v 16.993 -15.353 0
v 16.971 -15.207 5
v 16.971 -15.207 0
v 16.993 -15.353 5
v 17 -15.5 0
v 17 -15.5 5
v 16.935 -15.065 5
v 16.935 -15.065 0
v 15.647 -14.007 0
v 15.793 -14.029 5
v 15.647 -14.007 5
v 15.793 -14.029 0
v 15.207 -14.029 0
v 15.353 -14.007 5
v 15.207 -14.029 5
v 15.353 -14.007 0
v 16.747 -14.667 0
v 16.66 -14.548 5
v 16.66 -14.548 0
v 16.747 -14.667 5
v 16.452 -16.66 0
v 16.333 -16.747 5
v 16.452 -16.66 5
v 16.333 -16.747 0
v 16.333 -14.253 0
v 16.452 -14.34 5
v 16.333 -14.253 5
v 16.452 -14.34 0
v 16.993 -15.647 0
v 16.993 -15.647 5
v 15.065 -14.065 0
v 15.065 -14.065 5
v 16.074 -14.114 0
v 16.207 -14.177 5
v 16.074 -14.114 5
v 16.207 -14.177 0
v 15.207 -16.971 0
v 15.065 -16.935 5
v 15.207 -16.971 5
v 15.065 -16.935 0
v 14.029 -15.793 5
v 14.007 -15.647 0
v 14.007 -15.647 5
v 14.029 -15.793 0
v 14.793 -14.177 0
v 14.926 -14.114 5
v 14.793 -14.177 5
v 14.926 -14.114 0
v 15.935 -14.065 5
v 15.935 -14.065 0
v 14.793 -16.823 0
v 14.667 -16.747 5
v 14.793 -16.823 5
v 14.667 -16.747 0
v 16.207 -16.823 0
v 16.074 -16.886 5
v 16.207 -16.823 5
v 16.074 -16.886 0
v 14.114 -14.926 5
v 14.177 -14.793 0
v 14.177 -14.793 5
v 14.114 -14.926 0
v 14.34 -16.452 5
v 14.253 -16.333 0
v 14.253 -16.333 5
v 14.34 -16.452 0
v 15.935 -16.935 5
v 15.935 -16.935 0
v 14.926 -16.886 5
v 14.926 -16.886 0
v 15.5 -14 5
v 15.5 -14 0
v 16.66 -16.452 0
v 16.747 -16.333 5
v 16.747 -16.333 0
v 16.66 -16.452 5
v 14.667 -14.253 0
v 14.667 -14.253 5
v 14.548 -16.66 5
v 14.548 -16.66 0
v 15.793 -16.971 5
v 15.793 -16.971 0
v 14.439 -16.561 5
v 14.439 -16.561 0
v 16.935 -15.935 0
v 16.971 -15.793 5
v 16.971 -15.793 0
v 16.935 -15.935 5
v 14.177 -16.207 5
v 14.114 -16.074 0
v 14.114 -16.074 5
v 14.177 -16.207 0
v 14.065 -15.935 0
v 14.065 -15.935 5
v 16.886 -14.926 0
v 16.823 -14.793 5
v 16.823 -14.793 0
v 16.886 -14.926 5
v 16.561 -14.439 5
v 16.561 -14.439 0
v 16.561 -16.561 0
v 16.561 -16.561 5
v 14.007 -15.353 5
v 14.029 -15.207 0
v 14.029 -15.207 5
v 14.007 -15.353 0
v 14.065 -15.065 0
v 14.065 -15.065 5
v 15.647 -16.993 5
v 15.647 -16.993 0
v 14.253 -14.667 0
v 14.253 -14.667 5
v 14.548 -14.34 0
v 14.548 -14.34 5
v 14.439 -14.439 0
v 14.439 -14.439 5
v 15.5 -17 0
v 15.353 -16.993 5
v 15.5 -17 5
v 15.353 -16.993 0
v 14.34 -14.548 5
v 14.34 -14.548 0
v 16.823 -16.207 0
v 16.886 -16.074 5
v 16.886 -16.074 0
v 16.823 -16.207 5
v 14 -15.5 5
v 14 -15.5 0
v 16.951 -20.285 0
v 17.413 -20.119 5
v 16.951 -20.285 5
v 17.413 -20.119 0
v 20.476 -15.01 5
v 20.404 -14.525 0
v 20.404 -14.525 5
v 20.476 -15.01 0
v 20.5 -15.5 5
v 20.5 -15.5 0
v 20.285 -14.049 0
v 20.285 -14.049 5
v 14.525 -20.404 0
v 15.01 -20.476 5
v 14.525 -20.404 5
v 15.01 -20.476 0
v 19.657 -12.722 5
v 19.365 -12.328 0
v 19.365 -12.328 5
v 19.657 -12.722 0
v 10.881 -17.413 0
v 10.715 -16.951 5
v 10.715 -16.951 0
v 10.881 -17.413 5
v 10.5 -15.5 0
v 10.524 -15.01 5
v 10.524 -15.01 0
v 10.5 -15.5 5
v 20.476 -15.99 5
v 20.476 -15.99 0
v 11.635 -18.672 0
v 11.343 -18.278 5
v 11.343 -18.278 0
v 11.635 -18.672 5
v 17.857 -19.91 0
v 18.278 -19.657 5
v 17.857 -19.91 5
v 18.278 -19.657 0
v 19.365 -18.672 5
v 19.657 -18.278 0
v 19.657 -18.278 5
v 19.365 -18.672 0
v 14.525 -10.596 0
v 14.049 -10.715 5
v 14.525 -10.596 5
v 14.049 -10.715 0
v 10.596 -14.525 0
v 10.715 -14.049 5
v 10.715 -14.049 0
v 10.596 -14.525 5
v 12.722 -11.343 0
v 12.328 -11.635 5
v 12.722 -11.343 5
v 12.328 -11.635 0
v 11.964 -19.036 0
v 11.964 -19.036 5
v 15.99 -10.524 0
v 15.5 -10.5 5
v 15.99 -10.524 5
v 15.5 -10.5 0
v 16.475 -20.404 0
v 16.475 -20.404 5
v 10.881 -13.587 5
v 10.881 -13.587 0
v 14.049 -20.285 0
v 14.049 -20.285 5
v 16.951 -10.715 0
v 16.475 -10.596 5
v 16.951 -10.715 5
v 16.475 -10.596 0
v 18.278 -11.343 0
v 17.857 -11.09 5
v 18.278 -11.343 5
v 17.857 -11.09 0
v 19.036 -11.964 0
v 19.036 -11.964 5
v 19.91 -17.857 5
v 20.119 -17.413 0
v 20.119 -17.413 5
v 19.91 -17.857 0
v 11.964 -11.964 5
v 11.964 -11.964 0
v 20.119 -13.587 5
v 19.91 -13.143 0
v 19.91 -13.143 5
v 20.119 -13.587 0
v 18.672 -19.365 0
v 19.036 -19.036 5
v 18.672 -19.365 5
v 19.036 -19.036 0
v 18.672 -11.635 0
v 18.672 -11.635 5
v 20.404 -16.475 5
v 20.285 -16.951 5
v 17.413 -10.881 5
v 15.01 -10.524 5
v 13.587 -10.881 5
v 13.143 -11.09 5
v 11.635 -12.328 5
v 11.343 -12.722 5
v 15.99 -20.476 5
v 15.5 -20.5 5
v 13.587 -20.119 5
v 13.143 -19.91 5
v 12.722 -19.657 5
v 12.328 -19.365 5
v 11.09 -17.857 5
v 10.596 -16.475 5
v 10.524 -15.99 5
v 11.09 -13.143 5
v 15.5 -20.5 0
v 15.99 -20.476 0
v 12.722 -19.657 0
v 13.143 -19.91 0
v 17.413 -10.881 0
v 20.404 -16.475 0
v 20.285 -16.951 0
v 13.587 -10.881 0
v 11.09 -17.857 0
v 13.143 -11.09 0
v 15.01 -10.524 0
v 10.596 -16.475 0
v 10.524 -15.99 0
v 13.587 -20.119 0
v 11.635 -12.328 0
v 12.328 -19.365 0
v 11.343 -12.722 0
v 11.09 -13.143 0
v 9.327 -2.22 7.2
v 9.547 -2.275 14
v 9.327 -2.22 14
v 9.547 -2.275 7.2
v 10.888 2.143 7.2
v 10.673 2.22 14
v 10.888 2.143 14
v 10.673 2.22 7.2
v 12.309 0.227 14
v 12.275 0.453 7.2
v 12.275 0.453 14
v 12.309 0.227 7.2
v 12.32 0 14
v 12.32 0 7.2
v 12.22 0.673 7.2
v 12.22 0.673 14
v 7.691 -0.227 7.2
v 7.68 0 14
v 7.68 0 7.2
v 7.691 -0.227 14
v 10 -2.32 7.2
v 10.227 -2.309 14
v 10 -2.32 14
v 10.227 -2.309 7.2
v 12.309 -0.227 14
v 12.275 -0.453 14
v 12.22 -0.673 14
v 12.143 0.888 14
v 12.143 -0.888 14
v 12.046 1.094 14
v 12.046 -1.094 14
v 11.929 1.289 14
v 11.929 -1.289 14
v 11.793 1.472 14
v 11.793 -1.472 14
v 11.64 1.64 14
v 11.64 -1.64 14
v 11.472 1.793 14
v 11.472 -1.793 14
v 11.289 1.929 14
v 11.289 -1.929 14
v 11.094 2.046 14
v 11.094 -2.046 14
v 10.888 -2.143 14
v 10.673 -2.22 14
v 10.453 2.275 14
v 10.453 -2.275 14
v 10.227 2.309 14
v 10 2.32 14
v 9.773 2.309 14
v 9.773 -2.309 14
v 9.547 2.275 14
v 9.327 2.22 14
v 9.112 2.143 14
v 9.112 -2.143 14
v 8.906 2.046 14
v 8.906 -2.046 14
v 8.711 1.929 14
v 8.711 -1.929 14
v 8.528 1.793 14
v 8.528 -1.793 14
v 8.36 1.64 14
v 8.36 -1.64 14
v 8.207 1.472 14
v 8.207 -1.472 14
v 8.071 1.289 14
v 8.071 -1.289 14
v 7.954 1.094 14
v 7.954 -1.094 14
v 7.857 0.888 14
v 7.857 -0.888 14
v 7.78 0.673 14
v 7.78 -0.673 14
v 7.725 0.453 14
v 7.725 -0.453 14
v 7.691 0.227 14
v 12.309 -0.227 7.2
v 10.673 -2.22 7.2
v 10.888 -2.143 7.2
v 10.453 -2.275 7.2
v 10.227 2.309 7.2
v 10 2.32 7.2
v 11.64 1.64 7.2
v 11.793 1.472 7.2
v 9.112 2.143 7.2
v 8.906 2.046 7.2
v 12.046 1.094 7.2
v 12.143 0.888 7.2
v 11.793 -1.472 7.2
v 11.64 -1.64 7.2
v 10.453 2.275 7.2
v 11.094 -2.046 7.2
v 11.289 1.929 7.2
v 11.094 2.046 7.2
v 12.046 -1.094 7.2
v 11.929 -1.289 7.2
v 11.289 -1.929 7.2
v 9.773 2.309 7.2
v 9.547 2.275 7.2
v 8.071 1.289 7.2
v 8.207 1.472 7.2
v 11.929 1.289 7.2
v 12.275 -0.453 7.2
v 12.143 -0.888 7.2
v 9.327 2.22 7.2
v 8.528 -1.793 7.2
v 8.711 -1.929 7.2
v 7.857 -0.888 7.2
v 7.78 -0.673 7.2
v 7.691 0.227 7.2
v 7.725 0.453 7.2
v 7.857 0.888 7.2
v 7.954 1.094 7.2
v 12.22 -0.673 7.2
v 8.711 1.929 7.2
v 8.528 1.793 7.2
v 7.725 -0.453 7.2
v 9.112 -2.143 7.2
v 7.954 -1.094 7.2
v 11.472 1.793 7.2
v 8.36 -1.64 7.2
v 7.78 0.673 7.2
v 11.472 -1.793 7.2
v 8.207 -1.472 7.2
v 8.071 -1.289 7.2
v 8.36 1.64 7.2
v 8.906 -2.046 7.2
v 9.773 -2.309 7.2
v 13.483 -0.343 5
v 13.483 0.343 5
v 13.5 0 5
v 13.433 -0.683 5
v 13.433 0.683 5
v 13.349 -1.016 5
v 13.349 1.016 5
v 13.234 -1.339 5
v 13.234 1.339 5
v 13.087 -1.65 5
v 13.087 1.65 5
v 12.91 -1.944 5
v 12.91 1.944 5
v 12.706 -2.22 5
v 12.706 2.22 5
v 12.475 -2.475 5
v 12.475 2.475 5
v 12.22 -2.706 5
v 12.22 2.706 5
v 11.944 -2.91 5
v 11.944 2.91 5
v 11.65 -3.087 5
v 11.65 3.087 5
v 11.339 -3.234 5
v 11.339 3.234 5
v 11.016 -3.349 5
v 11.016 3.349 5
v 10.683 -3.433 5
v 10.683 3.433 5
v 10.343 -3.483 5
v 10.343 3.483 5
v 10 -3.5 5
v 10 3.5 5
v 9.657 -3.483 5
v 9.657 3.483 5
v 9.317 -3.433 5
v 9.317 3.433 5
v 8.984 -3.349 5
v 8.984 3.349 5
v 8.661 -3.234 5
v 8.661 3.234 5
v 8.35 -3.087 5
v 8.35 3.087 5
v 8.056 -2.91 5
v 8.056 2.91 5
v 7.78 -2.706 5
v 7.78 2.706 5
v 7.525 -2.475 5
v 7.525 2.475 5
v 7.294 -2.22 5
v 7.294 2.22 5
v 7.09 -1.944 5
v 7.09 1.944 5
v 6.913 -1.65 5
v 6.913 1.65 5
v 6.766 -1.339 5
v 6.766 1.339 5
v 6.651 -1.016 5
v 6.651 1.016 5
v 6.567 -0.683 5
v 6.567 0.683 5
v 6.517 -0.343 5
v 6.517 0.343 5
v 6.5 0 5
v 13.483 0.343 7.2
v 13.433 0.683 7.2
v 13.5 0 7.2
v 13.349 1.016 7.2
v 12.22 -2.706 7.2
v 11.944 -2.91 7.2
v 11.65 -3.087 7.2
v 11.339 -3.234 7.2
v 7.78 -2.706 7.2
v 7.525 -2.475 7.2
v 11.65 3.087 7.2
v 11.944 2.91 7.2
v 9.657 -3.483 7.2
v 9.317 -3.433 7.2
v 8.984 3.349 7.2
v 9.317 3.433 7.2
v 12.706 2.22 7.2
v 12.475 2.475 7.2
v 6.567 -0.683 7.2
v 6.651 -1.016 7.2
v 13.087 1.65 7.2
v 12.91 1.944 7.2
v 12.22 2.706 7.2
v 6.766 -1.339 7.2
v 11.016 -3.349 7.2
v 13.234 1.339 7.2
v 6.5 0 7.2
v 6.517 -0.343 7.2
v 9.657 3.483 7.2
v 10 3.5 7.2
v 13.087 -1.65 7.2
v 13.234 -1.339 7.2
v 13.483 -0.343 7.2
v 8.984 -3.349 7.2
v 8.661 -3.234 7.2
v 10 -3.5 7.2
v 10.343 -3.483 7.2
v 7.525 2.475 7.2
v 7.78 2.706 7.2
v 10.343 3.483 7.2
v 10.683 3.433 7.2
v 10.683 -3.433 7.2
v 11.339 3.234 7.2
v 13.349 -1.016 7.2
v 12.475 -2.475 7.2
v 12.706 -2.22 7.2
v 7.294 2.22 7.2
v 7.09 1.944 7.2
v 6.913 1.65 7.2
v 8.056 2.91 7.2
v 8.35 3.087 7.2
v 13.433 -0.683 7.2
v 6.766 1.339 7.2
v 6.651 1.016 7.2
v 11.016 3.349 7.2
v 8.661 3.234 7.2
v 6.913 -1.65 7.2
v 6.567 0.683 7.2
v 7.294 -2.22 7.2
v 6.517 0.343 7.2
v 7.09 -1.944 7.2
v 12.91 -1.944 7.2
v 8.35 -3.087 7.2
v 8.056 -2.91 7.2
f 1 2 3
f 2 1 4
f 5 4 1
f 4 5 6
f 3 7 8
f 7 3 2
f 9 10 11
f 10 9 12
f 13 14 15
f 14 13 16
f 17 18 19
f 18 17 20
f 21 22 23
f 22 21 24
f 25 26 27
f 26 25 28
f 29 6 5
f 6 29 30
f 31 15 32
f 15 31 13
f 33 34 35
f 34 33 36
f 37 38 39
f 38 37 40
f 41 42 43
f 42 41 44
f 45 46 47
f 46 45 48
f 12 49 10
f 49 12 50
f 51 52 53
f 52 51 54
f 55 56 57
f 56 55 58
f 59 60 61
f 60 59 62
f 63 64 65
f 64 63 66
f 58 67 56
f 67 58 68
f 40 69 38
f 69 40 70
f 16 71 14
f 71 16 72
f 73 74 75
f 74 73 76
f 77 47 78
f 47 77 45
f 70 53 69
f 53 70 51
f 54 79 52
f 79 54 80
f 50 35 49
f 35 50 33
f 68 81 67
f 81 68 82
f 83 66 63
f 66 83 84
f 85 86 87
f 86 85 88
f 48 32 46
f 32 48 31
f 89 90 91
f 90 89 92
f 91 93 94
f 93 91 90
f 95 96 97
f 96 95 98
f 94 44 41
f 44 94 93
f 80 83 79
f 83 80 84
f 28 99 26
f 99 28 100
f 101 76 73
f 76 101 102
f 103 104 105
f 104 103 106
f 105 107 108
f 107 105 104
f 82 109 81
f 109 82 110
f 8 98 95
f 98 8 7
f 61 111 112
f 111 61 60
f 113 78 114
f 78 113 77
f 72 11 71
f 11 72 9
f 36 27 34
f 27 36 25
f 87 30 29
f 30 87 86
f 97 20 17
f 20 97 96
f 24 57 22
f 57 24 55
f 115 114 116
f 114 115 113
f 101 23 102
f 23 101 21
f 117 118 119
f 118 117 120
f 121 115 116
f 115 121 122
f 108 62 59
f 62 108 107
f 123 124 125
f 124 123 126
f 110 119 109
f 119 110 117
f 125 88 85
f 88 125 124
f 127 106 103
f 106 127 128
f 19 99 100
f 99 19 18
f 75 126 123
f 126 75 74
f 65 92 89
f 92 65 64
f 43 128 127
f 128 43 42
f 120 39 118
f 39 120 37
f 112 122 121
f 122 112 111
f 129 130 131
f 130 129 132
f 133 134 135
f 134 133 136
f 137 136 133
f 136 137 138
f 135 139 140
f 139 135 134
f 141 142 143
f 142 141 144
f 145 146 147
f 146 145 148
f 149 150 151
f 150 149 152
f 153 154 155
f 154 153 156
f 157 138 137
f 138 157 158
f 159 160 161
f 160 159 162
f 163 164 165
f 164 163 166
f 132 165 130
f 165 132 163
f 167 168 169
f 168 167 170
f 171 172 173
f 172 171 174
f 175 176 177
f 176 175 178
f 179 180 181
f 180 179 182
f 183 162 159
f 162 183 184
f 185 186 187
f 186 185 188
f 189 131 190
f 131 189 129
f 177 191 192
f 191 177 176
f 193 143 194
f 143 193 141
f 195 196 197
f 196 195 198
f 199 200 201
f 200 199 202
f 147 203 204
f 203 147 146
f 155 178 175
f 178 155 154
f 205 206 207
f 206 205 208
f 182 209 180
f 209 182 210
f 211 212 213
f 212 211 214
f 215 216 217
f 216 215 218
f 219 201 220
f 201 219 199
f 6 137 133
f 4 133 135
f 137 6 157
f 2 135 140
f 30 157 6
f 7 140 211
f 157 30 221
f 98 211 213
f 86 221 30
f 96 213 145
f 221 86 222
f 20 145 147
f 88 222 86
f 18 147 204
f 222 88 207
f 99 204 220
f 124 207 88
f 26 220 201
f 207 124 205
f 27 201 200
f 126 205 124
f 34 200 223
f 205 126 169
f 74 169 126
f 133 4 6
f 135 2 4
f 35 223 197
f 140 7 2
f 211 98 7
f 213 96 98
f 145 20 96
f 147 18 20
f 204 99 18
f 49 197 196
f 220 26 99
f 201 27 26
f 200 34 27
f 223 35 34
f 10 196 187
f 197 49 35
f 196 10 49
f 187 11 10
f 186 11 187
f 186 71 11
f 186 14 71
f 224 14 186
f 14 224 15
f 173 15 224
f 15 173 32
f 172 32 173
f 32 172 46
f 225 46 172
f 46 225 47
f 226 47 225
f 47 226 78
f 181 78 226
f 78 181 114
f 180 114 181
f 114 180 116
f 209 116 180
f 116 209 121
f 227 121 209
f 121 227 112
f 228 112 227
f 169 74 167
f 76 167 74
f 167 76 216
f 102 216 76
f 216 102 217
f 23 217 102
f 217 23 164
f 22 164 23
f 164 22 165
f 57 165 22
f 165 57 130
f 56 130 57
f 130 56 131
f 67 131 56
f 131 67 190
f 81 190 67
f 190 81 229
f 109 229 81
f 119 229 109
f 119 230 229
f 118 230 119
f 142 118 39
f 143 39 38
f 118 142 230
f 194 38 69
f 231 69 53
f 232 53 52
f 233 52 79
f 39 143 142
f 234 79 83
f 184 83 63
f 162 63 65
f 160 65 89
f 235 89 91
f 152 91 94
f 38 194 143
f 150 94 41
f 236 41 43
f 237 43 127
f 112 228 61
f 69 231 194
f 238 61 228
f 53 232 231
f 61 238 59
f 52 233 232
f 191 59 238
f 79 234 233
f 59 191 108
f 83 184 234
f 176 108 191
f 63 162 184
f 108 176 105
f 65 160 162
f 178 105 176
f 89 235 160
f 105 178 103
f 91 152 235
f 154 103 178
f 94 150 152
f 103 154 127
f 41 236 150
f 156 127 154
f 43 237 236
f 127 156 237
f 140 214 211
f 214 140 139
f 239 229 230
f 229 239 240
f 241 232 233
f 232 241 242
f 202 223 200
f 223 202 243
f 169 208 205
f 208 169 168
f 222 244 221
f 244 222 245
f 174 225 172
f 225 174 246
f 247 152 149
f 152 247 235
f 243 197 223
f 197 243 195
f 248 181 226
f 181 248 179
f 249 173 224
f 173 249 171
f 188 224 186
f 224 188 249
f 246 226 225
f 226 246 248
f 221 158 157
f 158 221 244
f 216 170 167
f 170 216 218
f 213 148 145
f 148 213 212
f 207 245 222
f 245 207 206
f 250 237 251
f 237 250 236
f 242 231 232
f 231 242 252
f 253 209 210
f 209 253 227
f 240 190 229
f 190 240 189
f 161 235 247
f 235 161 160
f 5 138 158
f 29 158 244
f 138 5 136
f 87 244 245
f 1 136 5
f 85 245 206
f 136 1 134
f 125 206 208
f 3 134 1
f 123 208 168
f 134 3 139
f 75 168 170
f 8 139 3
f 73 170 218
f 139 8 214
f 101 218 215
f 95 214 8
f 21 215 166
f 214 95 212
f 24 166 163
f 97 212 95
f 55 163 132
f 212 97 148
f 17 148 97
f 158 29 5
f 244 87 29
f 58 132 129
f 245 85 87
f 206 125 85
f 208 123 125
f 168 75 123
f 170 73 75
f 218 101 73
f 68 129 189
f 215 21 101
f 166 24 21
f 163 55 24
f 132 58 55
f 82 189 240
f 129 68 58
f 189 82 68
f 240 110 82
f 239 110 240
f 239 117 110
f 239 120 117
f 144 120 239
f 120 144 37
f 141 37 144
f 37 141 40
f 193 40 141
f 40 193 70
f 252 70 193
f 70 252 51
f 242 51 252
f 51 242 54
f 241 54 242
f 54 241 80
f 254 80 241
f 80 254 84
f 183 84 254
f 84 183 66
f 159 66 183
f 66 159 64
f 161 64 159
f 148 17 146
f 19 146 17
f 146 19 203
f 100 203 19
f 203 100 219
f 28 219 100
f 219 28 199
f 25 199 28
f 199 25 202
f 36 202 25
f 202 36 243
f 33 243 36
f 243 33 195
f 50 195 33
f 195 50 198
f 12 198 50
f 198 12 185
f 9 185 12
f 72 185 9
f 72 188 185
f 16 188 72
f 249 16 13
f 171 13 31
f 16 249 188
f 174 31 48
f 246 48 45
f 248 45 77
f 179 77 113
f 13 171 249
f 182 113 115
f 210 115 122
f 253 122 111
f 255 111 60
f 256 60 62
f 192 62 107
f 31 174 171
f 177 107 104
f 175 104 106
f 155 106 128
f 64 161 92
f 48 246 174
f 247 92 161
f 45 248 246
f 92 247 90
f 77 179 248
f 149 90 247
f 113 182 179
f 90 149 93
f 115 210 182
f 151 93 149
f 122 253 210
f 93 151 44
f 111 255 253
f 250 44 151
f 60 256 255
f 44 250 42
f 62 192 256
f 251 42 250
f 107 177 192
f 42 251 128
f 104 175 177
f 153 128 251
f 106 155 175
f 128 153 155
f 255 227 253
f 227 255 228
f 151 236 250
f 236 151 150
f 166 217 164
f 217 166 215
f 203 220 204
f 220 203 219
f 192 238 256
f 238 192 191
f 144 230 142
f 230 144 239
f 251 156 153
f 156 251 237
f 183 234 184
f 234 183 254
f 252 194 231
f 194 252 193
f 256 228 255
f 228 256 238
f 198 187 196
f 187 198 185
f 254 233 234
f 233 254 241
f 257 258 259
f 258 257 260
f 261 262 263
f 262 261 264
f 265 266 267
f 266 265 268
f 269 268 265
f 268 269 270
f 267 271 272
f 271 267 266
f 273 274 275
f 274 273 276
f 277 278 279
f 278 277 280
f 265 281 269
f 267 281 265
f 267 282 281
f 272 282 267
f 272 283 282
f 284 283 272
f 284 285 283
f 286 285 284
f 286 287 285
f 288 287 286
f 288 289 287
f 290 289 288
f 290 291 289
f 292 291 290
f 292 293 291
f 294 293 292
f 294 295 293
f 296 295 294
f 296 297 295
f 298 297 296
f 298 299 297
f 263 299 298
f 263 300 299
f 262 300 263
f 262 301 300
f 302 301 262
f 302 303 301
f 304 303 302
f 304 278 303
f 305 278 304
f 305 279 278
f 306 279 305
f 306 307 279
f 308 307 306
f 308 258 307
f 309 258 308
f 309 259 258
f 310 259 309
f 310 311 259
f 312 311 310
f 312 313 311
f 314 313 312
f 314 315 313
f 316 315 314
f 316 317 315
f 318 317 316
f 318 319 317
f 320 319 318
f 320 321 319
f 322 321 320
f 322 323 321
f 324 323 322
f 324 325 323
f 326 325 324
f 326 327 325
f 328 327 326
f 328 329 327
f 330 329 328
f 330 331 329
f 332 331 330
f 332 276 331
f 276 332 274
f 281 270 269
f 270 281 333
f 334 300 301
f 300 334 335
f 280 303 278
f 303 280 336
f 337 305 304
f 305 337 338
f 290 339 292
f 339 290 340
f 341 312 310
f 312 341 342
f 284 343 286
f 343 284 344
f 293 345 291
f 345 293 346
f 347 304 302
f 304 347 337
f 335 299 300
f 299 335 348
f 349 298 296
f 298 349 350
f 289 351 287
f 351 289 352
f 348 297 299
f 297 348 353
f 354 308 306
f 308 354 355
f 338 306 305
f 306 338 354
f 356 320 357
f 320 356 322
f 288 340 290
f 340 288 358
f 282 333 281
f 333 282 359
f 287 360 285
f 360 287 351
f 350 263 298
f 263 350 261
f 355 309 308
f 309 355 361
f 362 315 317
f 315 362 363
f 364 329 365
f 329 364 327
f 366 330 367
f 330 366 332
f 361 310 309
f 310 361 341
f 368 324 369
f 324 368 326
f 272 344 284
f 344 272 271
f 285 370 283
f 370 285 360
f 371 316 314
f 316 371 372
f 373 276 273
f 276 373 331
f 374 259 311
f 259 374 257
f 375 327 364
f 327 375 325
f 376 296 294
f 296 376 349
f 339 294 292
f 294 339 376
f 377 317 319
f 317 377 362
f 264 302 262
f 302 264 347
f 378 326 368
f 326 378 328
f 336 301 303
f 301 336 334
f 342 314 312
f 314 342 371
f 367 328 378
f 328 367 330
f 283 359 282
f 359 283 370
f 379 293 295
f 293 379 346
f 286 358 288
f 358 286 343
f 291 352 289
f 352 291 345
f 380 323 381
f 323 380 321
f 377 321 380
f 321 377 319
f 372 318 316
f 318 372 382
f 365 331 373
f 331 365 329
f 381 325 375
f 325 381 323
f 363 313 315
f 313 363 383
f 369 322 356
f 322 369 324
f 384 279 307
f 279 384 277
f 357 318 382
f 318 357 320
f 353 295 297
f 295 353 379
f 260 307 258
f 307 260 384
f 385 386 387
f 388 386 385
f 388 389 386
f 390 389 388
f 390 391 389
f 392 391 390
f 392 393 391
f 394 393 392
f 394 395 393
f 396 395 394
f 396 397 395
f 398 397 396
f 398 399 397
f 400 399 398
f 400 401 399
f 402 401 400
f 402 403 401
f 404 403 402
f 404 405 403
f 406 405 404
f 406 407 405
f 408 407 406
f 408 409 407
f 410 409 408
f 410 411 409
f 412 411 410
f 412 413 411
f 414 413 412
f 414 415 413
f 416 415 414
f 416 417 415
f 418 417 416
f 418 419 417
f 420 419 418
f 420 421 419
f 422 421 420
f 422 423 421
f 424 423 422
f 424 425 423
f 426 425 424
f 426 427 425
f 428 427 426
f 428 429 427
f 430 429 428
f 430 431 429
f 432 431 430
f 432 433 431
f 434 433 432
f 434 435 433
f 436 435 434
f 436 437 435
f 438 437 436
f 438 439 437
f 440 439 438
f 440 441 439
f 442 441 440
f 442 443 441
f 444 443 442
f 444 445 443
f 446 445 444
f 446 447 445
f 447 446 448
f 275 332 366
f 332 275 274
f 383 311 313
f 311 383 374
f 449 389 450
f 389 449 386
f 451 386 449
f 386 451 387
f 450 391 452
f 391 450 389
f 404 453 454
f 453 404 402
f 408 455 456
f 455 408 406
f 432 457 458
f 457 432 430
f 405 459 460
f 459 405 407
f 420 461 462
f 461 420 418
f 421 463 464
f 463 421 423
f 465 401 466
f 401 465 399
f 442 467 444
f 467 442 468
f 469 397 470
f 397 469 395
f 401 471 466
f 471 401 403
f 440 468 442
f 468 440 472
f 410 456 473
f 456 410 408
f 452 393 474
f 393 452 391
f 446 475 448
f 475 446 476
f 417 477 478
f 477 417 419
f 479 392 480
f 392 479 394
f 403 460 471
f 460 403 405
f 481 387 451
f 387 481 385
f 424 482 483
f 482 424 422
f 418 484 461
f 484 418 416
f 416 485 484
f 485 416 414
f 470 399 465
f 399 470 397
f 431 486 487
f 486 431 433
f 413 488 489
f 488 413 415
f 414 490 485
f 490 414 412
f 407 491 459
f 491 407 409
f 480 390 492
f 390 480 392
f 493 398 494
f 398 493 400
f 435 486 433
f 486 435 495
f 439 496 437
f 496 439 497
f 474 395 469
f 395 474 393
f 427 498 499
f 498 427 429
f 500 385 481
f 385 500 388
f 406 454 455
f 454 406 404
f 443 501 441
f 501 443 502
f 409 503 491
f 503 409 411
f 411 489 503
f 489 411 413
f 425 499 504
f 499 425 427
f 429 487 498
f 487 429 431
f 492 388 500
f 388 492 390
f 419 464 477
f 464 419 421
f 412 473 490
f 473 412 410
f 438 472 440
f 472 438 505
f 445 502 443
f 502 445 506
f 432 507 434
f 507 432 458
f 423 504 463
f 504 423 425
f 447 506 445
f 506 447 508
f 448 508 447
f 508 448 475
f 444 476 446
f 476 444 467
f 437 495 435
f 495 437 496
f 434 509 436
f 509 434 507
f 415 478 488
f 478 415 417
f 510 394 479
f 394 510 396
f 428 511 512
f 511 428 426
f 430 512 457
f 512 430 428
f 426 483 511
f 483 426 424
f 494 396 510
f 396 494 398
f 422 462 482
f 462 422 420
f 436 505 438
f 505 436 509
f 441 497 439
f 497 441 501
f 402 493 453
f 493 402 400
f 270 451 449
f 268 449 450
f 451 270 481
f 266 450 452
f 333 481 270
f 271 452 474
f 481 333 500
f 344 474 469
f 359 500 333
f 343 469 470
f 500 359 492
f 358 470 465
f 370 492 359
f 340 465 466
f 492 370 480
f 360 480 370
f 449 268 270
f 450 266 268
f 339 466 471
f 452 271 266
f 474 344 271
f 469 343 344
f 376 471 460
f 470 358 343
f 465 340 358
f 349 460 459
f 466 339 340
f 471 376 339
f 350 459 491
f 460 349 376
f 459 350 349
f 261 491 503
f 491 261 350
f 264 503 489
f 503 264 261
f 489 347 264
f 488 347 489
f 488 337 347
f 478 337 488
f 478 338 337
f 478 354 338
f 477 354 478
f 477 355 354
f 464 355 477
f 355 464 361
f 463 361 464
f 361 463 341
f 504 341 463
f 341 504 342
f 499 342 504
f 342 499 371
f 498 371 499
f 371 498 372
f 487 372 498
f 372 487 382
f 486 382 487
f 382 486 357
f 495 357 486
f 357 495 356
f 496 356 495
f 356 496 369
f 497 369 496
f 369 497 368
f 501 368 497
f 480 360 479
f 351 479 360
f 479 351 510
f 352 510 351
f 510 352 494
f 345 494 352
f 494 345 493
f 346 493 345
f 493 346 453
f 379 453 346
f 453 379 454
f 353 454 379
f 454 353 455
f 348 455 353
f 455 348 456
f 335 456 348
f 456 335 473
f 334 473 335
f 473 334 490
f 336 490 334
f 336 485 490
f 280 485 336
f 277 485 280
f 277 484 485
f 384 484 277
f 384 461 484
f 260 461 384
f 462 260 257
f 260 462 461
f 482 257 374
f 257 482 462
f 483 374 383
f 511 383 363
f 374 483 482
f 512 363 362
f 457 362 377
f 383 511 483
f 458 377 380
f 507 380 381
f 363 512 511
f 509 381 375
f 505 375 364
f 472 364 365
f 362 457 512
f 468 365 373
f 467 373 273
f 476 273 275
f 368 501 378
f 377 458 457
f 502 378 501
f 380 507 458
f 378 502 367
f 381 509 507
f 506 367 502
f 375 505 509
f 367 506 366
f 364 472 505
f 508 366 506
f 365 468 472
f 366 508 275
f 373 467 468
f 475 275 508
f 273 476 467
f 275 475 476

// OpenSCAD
x_filament = 4.4;
z_filament = 9.5;

x_idler = 10;

module mk8() {
	translate([0,0,z_filament])
	rotate_extrude(convexity = 10, $fn = 100)
	import (file = "MyExtruder_v1.2.dxf", layer = "mk8");
}

module base() {

difference() {

	union() {

		// Import the 2D design
		linear_extrude(height = 3, center = false, convexity = 10)
  			import (file = "MyExtruder_v1.2.dxf", layer = "base", $fn=64);
		linear_extrude(height = 14, center = false, convexity = 10)
   			import (file = "MyExtruder_v1.2.dxf", layer = "base_top", $fn=64);

		// Support for the idler hinge
		translate([15.5,-15.5,0]) {
			cylinder(r=5, h=5, $fn=64);
		}
	}

	union() {

		// Import the 2D design
		translate([0,0,-1]) linear_extrude(height = 16, center = false, convexity = 10)
  			import (file = "MyExtruder_v1.2.dxf", layer = "base_hole", $fn=64);

		translate([0,0,z_filament])
		rotate_extrude(convexity = 10, $fn = 100)
		import (file = "MyExtruder_v1.2.dxf", layer = "mk8ext");

		// Hole for the motor screws
		translate([15.5,-15.5,-1]) cylinder(r=1.5, h=16, $fn=64);
		translate([-15.5,-15.5,-1]) cylinder(r=1.5, h=16, $fn=64);
		translate([15.5,15.5,-1]) cylinder(r=1.5, h=16, $fn=64);
		translate([-15.5,15.5,-1]) cylinder(r=1.5, h=16, $fn=64);

		// motor hole
		translate([0,0,-1]) cylinder(r=11.1, h=3, $fn=64);

		// Hole for the filament
		translate([x_filament,35,z_filament]) rotate([90,0,0]) cylinder(r=1.2, h=70, $fn=64);

		// Hole for the spring nut
		translate([6,21,9.5]) rotate([0,90,0]) cylinder(r=2, h=12, $fn=64);
		translate([7.8,17.4,15.5]) rotate([0,90,0]) cube([10,7.2,3.2]);

		// Hole for the hot-end
		translate([x_filament,-21,z_filament]) rotate([90,0,0]) cylinder(r=8.05, h=4.1, $fn=64);
		translate([x_filament,-25,z_filament]) rotate([90,0,0]) cylinder(r=6.05, h=6, $fn=64);
		translate([x_filament-8.05,-21,z_filament]) rotate([90,0,0]) cube([16.1, 10, 4.1]);
		translate([x_filament-6.05,-25,z_filament]) rotate([90,0,0]) cube([12.1, 10, 6]);

		// Holes for the hod-end mount screws
		translate([15.5,-26,-1]) {
				cylinder(r=1.5, h=16, $fn=64);
				cylinder(r=3.3, h=6, $fn=6);
		}
		translate([-15.5+8,-26,-1]) {
			cylinder(r=1.5, h=16, $fn=64);
			cylinder(r=3.3, h=6, $fn=6);
		}

		// Hole for the fan mount
		translate([-17.5,-28+3.6,10]) rotate([0,90,0]) cylinder(r=2, h=8, $fn=64);
		translate([-13.5,-28,16]) rotate([0,90,0]) cube([10,7.2,3.2]);

	}

}
	// Import the 2D design, Add some support
		translate([0,0,0]) linear_extrude(height = 2, center = false, convexity = 10)
  			import (file = "MyExtruder_v1.2.dxf", layer = "support", $fn=64);

}

module hot_end_mount() {
difference() {

	union() {
		// Import the 2D design
		translate([0,0,14]) linear_extrude(height = 5, center = false, convexity = 10)
  			import (file = "MyExtruder_v1.2.dxf", layer = "hot_mount", $fn=64);

	}

	union() {

		// Hole for the hot-end
		translate([4,-20.9,z_filament-0.1]) rotate([90,0,0]) cylinder(r=8.05, h=4.2, $fn=64);
		translate([4,-25,z_filament-0.1]) rotate([90,0,0]) cylinder(r=6.05, h=6.1, $fn=64);

		translate([-25,-50, 0]) cube([50,50,12]);

		// Holes for the hod-end mount screws
		translate([15.5,-26,10]) {
				cylinder(r=1.5, h=16, $fn=64);
				//cylinder(r=3.3, h=4, $fn=6);
		}
		translate([-15.5+8,-26,10]) {
			cylinder(r=1.5, h=16, $fn=64);
			//cylinder(r=3.3, h=4, $fn=6);
		}

	}

}

}


module idler() {

difference() {

	union() {

		// Import the 2D design
		linear_extrude(height = 2, center = false, convexity = 10)
  			import (file = "MyExtruder_v1.2.dxf", layer = "idler_base", $fn=64);
		linear_extrude(height = 9, center = false, convexity = 10)
   			import (file = "MyExtruder_v1.2.dxf", layer = "idler", $fn=64);

		// Support for the bearing
		translate([x_idler,0,0]) {
			cylinder(r=2.32, h=9, $fn=64);
			cylinder(r=3.5, h=2.2, $fn=64);
		}
	}

	union() {

		// Hole for the bearing screw (to be taped M3)
		//translate([x_idler,0,-1]) cylinder(r=1.47, h=12, $fn=64);

		// Hole for the hinge screw
		translate([15.5,-15.5,-1]) cylinder(r=1.5, h=12, $fn=64);

		// Hole for the filament
		translate([15,22,z_filament-5]) rotate([0,90,0]) cylinder(r=2, h=12, $fn=64);
		translate([15,20,z_filament-5]) rotate([0,90,0]) cylinder(r=2, h=12, $fn=64);
		translate([15,20,z_filament-3]) rotate([0,90,0]) cube([4,2,12]);

		// Hole for the spring
		translate([5,12,4.5]) rotate([90,0,0]) cylinder(r=1.2, h=12, $fn=64);
		translate([0,12,3.3]) rotate([90,0,0]) cube([5,2.4,12]);
	}

}

}
mk8();
base();
translate([0,0,1])
rotate([0, 180, 0]) hot_end_mount();
translate([0,0,5])
idler();
%translate([x_filament,35,z_filament]) rotate([90,0,0]) cylinder(r=1.75/2, h=70, $fn=64);
